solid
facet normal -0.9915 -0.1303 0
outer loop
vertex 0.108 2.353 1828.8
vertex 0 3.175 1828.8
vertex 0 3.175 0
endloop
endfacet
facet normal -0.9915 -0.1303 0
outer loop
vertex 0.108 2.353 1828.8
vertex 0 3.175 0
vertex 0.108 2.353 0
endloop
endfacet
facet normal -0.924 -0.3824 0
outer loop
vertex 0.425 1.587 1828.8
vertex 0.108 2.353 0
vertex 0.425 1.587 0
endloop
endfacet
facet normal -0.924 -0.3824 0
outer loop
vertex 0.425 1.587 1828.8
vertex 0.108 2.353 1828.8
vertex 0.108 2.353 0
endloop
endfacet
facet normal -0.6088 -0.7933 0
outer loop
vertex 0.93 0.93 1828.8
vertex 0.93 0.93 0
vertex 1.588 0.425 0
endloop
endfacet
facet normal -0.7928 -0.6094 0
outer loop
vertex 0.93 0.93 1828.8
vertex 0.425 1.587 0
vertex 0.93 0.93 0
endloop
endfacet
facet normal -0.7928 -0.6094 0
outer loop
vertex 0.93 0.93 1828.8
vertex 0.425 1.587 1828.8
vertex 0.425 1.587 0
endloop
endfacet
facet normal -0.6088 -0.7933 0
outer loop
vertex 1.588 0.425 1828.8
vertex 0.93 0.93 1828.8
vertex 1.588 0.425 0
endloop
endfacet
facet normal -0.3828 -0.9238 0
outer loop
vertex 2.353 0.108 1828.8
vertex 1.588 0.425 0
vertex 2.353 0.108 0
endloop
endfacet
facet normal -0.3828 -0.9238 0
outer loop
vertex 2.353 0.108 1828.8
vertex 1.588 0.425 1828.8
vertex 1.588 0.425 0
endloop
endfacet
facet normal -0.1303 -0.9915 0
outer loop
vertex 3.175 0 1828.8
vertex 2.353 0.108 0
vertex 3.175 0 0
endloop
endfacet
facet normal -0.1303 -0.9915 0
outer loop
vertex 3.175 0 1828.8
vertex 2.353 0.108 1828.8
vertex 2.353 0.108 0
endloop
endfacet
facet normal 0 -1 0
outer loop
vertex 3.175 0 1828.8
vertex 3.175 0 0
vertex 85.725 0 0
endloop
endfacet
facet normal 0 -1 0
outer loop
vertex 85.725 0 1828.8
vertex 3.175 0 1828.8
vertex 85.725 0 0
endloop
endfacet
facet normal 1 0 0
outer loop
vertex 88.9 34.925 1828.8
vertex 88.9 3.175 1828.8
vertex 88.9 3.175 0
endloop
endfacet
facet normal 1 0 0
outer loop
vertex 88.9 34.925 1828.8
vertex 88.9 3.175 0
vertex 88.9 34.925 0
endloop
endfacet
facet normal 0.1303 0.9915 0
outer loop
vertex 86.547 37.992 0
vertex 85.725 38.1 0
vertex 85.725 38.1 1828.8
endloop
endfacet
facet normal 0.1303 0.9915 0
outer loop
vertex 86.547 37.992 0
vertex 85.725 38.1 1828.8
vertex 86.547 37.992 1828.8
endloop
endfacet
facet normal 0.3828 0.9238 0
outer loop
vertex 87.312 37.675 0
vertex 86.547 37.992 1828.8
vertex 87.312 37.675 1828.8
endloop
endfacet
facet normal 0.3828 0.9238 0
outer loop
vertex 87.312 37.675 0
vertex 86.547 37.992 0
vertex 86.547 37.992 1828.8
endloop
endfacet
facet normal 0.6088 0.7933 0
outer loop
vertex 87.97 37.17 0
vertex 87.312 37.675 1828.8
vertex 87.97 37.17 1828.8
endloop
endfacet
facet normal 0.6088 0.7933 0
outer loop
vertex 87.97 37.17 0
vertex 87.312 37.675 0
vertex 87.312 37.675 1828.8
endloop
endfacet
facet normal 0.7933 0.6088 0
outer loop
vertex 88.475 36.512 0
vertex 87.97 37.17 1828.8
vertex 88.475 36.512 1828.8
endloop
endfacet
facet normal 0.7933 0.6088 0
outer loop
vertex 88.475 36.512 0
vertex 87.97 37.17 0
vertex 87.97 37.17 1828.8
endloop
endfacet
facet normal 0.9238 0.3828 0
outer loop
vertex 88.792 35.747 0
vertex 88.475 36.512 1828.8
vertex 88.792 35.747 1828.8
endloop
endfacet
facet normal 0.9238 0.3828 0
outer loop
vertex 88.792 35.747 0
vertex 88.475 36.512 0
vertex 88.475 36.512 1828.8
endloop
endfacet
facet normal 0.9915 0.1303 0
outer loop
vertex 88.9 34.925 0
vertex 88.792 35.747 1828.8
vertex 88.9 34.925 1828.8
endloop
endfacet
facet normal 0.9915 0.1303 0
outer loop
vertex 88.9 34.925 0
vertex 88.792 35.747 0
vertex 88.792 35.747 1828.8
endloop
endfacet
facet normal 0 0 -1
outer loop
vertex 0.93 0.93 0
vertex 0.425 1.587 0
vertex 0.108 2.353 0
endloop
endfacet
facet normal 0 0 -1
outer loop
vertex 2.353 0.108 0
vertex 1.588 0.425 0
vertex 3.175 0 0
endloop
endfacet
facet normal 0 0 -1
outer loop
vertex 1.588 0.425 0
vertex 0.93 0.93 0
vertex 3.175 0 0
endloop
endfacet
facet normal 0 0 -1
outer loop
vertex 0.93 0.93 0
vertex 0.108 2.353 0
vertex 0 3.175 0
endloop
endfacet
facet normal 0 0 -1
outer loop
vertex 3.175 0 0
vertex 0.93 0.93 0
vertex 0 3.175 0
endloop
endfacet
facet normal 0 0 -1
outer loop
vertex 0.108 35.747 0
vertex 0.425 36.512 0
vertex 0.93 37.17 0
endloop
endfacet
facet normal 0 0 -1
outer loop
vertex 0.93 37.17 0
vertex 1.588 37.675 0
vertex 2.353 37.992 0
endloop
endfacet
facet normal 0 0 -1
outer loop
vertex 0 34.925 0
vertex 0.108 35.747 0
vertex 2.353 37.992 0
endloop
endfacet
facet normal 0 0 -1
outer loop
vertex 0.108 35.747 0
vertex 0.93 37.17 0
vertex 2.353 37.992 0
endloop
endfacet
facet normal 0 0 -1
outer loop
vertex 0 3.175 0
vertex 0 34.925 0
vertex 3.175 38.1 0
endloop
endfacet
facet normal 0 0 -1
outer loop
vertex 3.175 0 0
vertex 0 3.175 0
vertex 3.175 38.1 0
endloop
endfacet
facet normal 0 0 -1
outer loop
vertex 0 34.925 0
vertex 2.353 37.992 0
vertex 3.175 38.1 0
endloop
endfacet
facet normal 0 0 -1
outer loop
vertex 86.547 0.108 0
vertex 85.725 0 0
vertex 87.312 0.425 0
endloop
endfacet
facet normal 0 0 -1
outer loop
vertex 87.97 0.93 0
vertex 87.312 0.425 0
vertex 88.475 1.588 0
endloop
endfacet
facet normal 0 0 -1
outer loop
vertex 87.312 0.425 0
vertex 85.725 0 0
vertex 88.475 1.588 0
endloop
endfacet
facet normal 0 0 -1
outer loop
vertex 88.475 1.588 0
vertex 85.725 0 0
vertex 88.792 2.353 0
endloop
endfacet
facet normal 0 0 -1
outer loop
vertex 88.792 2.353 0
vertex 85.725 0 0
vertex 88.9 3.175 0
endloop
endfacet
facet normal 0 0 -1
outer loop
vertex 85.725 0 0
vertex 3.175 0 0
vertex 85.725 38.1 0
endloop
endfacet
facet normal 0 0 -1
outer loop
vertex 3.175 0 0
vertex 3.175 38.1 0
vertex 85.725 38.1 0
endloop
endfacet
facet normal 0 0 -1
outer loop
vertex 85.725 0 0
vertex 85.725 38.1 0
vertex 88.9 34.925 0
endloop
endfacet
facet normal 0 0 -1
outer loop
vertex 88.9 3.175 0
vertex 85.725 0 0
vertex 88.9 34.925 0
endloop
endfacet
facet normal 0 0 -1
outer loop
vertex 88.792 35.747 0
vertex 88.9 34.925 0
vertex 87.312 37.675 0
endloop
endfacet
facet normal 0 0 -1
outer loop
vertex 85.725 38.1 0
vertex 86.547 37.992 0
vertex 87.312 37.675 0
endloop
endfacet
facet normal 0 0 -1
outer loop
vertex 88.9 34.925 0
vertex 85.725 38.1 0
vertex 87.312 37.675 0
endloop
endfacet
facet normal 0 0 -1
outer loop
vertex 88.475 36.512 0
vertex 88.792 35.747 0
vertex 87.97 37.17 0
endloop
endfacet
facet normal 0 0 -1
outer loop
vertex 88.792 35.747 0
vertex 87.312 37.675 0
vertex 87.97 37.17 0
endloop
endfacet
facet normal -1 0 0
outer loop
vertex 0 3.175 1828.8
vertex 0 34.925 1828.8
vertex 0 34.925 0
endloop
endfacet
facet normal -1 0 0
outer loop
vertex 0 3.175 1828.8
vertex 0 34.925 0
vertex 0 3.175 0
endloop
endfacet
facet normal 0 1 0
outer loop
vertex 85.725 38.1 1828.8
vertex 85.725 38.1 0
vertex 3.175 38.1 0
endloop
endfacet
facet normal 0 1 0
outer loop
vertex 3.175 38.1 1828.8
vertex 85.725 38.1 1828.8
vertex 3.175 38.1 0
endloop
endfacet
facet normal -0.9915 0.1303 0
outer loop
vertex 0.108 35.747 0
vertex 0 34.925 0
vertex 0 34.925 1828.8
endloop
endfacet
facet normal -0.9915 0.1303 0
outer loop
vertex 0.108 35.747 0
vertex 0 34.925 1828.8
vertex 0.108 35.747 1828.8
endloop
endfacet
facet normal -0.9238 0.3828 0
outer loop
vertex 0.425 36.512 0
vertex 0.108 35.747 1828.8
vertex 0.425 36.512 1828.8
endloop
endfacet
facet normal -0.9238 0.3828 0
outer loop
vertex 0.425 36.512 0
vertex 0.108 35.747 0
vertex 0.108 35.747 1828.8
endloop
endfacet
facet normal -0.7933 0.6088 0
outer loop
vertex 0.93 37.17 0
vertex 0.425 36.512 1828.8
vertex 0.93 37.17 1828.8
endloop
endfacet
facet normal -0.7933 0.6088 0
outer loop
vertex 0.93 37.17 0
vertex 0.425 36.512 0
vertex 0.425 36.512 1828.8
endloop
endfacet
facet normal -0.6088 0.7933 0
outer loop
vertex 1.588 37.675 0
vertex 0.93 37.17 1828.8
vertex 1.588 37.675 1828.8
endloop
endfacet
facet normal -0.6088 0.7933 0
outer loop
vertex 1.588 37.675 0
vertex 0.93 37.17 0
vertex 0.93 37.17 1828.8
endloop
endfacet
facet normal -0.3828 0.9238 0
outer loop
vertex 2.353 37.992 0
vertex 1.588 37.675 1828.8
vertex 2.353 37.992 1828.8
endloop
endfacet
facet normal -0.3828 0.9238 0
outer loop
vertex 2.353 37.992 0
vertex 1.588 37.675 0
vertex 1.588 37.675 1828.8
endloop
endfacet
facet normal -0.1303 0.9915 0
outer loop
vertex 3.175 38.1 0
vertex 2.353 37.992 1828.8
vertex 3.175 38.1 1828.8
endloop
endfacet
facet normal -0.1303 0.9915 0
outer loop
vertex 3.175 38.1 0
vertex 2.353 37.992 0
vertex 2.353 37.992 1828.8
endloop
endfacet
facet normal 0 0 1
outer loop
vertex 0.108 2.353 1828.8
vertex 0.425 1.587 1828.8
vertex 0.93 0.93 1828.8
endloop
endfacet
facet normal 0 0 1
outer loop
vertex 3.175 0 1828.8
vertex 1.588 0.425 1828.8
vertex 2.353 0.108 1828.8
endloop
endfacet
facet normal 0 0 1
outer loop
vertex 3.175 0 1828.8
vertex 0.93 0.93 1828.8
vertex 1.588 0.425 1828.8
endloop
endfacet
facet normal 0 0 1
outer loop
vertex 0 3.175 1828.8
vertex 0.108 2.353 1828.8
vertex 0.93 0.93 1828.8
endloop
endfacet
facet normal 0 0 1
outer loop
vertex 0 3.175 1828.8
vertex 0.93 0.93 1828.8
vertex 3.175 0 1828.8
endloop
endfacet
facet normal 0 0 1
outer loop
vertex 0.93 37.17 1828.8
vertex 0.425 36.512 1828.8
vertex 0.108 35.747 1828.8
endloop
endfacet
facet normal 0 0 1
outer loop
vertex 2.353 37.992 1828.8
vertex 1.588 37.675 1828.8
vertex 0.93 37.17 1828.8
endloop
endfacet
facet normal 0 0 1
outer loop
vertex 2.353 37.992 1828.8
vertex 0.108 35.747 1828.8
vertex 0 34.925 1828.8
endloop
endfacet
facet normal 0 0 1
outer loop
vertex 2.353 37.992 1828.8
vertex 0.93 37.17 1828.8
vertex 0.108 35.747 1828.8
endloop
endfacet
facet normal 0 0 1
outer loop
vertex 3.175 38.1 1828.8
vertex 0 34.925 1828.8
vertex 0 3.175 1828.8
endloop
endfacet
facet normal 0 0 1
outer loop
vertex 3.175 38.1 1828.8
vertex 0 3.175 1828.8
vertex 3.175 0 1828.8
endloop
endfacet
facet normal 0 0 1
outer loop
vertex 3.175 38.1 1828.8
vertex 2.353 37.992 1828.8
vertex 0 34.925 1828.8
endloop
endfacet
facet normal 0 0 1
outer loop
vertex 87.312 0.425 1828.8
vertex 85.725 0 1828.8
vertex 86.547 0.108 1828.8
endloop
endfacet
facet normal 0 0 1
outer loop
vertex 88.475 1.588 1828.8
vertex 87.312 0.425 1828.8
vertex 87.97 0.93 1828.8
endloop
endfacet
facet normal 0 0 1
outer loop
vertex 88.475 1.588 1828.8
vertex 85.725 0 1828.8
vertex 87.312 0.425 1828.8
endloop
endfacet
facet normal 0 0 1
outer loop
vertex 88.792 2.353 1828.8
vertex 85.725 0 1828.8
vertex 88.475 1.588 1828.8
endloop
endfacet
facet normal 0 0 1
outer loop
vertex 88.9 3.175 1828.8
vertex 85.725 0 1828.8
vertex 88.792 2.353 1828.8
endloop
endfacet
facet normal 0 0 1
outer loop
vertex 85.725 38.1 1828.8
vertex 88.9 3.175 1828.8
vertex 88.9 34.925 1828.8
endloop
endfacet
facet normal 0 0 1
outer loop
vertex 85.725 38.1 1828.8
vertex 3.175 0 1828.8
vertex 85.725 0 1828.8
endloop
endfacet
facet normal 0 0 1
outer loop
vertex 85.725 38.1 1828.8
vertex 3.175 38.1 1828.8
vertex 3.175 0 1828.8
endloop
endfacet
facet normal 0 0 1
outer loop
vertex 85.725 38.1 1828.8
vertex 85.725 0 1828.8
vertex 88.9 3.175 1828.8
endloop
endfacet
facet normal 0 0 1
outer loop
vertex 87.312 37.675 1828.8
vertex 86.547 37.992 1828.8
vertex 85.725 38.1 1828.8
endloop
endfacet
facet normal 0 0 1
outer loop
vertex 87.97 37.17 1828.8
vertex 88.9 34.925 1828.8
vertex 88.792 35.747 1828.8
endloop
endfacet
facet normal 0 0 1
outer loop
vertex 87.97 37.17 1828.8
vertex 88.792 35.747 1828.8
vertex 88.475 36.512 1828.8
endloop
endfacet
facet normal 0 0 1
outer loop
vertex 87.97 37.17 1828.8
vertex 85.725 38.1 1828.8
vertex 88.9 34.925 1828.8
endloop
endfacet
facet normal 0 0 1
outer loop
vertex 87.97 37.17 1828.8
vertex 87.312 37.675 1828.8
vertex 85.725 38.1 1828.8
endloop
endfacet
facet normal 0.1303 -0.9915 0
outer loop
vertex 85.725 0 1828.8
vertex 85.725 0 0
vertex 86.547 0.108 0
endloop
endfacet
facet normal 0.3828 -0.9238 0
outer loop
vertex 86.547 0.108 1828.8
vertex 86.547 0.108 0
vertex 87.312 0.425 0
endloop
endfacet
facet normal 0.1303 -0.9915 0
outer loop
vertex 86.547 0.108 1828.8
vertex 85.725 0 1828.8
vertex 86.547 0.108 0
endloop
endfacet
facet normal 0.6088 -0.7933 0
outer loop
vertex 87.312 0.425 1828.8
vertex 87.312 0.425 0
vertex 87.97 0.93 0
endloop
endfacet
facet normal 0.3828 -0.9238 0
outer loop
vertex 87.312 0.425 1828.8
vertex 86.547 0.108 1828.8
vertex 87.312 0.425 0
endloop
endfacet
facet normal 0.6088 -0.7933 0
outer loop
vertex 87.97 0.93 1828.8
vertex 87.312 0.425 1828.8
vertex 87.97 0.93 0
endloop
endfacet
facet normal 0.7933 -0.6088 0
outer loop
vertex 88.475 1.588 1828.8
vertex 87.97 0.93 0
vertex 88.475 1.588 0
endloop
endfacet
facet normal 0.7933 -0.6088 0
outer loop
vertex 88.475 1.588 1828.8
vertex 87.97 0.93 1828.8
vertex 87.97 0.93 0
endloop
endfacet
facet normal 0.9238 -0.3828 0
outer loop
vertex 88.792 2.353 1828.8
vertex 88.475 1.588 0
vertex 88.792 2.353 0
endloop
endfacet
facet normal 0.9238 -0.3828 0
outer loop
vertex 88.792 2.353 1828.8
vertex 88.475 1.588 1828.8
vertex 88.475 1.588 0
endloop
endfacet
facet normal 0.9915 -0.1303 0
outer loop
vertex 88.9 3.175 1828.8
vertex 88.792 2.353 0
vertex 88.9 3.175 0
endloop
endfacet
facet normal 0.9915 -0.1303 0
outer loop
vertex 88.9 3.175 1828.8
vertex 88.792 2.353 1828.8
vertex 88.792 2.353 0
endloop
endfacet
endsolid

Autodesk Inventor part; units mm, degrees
ref_plane "YZ Plane" through (0, 0, 0) normal (1, 0, 0) x (0, 1, 0)
ref_plane "XZ Plane" through (0, 0, 0) normal (0, 1, 0) x (-1, 0, 0)
ref_plane "XY Plane" through (0, 0, 0) normal (0, 0, 1) x (1, 0, 0)
sketch "Sketch1" plane through (0, 0, 0) normal (0, 0, 1) x (1, 0, 0)
  line L0 (0, 0) -> (88.9, 0)
  line L1 (88.9, 0) -> (88.9, 34.925)
  line L2 (85.725, 38.1) -> (3.175, 38.1)
  line L3 (0, 34.925) -> (0, 0)
  arc A0 (3.175, 38.1) -> (0, 34.925) centre (3.175, 34.925) ccw
  arc A1 (88.9, 34.925) -> (85.725, 38.1) centre (85.725, 34.925) ccw
  point P0 (88.9, 38.1)
  point P1 (0, 38.1)
  dimension "Width" = 88.9
  dimension "Height" = 38.1
  dimension "d2" = 3.175
extrude "Extrusion1" add sketch "Sketch1" along normal blind 1828.8
fillet "Fillet1" radius 3.175 1 edges at (88.9, 0, 914.4)
fillet "Fillet2" radius 3.175 1 edges at (0, 0, 914.4)
properties part number "2x4x48" material "Wood (Oak)"
